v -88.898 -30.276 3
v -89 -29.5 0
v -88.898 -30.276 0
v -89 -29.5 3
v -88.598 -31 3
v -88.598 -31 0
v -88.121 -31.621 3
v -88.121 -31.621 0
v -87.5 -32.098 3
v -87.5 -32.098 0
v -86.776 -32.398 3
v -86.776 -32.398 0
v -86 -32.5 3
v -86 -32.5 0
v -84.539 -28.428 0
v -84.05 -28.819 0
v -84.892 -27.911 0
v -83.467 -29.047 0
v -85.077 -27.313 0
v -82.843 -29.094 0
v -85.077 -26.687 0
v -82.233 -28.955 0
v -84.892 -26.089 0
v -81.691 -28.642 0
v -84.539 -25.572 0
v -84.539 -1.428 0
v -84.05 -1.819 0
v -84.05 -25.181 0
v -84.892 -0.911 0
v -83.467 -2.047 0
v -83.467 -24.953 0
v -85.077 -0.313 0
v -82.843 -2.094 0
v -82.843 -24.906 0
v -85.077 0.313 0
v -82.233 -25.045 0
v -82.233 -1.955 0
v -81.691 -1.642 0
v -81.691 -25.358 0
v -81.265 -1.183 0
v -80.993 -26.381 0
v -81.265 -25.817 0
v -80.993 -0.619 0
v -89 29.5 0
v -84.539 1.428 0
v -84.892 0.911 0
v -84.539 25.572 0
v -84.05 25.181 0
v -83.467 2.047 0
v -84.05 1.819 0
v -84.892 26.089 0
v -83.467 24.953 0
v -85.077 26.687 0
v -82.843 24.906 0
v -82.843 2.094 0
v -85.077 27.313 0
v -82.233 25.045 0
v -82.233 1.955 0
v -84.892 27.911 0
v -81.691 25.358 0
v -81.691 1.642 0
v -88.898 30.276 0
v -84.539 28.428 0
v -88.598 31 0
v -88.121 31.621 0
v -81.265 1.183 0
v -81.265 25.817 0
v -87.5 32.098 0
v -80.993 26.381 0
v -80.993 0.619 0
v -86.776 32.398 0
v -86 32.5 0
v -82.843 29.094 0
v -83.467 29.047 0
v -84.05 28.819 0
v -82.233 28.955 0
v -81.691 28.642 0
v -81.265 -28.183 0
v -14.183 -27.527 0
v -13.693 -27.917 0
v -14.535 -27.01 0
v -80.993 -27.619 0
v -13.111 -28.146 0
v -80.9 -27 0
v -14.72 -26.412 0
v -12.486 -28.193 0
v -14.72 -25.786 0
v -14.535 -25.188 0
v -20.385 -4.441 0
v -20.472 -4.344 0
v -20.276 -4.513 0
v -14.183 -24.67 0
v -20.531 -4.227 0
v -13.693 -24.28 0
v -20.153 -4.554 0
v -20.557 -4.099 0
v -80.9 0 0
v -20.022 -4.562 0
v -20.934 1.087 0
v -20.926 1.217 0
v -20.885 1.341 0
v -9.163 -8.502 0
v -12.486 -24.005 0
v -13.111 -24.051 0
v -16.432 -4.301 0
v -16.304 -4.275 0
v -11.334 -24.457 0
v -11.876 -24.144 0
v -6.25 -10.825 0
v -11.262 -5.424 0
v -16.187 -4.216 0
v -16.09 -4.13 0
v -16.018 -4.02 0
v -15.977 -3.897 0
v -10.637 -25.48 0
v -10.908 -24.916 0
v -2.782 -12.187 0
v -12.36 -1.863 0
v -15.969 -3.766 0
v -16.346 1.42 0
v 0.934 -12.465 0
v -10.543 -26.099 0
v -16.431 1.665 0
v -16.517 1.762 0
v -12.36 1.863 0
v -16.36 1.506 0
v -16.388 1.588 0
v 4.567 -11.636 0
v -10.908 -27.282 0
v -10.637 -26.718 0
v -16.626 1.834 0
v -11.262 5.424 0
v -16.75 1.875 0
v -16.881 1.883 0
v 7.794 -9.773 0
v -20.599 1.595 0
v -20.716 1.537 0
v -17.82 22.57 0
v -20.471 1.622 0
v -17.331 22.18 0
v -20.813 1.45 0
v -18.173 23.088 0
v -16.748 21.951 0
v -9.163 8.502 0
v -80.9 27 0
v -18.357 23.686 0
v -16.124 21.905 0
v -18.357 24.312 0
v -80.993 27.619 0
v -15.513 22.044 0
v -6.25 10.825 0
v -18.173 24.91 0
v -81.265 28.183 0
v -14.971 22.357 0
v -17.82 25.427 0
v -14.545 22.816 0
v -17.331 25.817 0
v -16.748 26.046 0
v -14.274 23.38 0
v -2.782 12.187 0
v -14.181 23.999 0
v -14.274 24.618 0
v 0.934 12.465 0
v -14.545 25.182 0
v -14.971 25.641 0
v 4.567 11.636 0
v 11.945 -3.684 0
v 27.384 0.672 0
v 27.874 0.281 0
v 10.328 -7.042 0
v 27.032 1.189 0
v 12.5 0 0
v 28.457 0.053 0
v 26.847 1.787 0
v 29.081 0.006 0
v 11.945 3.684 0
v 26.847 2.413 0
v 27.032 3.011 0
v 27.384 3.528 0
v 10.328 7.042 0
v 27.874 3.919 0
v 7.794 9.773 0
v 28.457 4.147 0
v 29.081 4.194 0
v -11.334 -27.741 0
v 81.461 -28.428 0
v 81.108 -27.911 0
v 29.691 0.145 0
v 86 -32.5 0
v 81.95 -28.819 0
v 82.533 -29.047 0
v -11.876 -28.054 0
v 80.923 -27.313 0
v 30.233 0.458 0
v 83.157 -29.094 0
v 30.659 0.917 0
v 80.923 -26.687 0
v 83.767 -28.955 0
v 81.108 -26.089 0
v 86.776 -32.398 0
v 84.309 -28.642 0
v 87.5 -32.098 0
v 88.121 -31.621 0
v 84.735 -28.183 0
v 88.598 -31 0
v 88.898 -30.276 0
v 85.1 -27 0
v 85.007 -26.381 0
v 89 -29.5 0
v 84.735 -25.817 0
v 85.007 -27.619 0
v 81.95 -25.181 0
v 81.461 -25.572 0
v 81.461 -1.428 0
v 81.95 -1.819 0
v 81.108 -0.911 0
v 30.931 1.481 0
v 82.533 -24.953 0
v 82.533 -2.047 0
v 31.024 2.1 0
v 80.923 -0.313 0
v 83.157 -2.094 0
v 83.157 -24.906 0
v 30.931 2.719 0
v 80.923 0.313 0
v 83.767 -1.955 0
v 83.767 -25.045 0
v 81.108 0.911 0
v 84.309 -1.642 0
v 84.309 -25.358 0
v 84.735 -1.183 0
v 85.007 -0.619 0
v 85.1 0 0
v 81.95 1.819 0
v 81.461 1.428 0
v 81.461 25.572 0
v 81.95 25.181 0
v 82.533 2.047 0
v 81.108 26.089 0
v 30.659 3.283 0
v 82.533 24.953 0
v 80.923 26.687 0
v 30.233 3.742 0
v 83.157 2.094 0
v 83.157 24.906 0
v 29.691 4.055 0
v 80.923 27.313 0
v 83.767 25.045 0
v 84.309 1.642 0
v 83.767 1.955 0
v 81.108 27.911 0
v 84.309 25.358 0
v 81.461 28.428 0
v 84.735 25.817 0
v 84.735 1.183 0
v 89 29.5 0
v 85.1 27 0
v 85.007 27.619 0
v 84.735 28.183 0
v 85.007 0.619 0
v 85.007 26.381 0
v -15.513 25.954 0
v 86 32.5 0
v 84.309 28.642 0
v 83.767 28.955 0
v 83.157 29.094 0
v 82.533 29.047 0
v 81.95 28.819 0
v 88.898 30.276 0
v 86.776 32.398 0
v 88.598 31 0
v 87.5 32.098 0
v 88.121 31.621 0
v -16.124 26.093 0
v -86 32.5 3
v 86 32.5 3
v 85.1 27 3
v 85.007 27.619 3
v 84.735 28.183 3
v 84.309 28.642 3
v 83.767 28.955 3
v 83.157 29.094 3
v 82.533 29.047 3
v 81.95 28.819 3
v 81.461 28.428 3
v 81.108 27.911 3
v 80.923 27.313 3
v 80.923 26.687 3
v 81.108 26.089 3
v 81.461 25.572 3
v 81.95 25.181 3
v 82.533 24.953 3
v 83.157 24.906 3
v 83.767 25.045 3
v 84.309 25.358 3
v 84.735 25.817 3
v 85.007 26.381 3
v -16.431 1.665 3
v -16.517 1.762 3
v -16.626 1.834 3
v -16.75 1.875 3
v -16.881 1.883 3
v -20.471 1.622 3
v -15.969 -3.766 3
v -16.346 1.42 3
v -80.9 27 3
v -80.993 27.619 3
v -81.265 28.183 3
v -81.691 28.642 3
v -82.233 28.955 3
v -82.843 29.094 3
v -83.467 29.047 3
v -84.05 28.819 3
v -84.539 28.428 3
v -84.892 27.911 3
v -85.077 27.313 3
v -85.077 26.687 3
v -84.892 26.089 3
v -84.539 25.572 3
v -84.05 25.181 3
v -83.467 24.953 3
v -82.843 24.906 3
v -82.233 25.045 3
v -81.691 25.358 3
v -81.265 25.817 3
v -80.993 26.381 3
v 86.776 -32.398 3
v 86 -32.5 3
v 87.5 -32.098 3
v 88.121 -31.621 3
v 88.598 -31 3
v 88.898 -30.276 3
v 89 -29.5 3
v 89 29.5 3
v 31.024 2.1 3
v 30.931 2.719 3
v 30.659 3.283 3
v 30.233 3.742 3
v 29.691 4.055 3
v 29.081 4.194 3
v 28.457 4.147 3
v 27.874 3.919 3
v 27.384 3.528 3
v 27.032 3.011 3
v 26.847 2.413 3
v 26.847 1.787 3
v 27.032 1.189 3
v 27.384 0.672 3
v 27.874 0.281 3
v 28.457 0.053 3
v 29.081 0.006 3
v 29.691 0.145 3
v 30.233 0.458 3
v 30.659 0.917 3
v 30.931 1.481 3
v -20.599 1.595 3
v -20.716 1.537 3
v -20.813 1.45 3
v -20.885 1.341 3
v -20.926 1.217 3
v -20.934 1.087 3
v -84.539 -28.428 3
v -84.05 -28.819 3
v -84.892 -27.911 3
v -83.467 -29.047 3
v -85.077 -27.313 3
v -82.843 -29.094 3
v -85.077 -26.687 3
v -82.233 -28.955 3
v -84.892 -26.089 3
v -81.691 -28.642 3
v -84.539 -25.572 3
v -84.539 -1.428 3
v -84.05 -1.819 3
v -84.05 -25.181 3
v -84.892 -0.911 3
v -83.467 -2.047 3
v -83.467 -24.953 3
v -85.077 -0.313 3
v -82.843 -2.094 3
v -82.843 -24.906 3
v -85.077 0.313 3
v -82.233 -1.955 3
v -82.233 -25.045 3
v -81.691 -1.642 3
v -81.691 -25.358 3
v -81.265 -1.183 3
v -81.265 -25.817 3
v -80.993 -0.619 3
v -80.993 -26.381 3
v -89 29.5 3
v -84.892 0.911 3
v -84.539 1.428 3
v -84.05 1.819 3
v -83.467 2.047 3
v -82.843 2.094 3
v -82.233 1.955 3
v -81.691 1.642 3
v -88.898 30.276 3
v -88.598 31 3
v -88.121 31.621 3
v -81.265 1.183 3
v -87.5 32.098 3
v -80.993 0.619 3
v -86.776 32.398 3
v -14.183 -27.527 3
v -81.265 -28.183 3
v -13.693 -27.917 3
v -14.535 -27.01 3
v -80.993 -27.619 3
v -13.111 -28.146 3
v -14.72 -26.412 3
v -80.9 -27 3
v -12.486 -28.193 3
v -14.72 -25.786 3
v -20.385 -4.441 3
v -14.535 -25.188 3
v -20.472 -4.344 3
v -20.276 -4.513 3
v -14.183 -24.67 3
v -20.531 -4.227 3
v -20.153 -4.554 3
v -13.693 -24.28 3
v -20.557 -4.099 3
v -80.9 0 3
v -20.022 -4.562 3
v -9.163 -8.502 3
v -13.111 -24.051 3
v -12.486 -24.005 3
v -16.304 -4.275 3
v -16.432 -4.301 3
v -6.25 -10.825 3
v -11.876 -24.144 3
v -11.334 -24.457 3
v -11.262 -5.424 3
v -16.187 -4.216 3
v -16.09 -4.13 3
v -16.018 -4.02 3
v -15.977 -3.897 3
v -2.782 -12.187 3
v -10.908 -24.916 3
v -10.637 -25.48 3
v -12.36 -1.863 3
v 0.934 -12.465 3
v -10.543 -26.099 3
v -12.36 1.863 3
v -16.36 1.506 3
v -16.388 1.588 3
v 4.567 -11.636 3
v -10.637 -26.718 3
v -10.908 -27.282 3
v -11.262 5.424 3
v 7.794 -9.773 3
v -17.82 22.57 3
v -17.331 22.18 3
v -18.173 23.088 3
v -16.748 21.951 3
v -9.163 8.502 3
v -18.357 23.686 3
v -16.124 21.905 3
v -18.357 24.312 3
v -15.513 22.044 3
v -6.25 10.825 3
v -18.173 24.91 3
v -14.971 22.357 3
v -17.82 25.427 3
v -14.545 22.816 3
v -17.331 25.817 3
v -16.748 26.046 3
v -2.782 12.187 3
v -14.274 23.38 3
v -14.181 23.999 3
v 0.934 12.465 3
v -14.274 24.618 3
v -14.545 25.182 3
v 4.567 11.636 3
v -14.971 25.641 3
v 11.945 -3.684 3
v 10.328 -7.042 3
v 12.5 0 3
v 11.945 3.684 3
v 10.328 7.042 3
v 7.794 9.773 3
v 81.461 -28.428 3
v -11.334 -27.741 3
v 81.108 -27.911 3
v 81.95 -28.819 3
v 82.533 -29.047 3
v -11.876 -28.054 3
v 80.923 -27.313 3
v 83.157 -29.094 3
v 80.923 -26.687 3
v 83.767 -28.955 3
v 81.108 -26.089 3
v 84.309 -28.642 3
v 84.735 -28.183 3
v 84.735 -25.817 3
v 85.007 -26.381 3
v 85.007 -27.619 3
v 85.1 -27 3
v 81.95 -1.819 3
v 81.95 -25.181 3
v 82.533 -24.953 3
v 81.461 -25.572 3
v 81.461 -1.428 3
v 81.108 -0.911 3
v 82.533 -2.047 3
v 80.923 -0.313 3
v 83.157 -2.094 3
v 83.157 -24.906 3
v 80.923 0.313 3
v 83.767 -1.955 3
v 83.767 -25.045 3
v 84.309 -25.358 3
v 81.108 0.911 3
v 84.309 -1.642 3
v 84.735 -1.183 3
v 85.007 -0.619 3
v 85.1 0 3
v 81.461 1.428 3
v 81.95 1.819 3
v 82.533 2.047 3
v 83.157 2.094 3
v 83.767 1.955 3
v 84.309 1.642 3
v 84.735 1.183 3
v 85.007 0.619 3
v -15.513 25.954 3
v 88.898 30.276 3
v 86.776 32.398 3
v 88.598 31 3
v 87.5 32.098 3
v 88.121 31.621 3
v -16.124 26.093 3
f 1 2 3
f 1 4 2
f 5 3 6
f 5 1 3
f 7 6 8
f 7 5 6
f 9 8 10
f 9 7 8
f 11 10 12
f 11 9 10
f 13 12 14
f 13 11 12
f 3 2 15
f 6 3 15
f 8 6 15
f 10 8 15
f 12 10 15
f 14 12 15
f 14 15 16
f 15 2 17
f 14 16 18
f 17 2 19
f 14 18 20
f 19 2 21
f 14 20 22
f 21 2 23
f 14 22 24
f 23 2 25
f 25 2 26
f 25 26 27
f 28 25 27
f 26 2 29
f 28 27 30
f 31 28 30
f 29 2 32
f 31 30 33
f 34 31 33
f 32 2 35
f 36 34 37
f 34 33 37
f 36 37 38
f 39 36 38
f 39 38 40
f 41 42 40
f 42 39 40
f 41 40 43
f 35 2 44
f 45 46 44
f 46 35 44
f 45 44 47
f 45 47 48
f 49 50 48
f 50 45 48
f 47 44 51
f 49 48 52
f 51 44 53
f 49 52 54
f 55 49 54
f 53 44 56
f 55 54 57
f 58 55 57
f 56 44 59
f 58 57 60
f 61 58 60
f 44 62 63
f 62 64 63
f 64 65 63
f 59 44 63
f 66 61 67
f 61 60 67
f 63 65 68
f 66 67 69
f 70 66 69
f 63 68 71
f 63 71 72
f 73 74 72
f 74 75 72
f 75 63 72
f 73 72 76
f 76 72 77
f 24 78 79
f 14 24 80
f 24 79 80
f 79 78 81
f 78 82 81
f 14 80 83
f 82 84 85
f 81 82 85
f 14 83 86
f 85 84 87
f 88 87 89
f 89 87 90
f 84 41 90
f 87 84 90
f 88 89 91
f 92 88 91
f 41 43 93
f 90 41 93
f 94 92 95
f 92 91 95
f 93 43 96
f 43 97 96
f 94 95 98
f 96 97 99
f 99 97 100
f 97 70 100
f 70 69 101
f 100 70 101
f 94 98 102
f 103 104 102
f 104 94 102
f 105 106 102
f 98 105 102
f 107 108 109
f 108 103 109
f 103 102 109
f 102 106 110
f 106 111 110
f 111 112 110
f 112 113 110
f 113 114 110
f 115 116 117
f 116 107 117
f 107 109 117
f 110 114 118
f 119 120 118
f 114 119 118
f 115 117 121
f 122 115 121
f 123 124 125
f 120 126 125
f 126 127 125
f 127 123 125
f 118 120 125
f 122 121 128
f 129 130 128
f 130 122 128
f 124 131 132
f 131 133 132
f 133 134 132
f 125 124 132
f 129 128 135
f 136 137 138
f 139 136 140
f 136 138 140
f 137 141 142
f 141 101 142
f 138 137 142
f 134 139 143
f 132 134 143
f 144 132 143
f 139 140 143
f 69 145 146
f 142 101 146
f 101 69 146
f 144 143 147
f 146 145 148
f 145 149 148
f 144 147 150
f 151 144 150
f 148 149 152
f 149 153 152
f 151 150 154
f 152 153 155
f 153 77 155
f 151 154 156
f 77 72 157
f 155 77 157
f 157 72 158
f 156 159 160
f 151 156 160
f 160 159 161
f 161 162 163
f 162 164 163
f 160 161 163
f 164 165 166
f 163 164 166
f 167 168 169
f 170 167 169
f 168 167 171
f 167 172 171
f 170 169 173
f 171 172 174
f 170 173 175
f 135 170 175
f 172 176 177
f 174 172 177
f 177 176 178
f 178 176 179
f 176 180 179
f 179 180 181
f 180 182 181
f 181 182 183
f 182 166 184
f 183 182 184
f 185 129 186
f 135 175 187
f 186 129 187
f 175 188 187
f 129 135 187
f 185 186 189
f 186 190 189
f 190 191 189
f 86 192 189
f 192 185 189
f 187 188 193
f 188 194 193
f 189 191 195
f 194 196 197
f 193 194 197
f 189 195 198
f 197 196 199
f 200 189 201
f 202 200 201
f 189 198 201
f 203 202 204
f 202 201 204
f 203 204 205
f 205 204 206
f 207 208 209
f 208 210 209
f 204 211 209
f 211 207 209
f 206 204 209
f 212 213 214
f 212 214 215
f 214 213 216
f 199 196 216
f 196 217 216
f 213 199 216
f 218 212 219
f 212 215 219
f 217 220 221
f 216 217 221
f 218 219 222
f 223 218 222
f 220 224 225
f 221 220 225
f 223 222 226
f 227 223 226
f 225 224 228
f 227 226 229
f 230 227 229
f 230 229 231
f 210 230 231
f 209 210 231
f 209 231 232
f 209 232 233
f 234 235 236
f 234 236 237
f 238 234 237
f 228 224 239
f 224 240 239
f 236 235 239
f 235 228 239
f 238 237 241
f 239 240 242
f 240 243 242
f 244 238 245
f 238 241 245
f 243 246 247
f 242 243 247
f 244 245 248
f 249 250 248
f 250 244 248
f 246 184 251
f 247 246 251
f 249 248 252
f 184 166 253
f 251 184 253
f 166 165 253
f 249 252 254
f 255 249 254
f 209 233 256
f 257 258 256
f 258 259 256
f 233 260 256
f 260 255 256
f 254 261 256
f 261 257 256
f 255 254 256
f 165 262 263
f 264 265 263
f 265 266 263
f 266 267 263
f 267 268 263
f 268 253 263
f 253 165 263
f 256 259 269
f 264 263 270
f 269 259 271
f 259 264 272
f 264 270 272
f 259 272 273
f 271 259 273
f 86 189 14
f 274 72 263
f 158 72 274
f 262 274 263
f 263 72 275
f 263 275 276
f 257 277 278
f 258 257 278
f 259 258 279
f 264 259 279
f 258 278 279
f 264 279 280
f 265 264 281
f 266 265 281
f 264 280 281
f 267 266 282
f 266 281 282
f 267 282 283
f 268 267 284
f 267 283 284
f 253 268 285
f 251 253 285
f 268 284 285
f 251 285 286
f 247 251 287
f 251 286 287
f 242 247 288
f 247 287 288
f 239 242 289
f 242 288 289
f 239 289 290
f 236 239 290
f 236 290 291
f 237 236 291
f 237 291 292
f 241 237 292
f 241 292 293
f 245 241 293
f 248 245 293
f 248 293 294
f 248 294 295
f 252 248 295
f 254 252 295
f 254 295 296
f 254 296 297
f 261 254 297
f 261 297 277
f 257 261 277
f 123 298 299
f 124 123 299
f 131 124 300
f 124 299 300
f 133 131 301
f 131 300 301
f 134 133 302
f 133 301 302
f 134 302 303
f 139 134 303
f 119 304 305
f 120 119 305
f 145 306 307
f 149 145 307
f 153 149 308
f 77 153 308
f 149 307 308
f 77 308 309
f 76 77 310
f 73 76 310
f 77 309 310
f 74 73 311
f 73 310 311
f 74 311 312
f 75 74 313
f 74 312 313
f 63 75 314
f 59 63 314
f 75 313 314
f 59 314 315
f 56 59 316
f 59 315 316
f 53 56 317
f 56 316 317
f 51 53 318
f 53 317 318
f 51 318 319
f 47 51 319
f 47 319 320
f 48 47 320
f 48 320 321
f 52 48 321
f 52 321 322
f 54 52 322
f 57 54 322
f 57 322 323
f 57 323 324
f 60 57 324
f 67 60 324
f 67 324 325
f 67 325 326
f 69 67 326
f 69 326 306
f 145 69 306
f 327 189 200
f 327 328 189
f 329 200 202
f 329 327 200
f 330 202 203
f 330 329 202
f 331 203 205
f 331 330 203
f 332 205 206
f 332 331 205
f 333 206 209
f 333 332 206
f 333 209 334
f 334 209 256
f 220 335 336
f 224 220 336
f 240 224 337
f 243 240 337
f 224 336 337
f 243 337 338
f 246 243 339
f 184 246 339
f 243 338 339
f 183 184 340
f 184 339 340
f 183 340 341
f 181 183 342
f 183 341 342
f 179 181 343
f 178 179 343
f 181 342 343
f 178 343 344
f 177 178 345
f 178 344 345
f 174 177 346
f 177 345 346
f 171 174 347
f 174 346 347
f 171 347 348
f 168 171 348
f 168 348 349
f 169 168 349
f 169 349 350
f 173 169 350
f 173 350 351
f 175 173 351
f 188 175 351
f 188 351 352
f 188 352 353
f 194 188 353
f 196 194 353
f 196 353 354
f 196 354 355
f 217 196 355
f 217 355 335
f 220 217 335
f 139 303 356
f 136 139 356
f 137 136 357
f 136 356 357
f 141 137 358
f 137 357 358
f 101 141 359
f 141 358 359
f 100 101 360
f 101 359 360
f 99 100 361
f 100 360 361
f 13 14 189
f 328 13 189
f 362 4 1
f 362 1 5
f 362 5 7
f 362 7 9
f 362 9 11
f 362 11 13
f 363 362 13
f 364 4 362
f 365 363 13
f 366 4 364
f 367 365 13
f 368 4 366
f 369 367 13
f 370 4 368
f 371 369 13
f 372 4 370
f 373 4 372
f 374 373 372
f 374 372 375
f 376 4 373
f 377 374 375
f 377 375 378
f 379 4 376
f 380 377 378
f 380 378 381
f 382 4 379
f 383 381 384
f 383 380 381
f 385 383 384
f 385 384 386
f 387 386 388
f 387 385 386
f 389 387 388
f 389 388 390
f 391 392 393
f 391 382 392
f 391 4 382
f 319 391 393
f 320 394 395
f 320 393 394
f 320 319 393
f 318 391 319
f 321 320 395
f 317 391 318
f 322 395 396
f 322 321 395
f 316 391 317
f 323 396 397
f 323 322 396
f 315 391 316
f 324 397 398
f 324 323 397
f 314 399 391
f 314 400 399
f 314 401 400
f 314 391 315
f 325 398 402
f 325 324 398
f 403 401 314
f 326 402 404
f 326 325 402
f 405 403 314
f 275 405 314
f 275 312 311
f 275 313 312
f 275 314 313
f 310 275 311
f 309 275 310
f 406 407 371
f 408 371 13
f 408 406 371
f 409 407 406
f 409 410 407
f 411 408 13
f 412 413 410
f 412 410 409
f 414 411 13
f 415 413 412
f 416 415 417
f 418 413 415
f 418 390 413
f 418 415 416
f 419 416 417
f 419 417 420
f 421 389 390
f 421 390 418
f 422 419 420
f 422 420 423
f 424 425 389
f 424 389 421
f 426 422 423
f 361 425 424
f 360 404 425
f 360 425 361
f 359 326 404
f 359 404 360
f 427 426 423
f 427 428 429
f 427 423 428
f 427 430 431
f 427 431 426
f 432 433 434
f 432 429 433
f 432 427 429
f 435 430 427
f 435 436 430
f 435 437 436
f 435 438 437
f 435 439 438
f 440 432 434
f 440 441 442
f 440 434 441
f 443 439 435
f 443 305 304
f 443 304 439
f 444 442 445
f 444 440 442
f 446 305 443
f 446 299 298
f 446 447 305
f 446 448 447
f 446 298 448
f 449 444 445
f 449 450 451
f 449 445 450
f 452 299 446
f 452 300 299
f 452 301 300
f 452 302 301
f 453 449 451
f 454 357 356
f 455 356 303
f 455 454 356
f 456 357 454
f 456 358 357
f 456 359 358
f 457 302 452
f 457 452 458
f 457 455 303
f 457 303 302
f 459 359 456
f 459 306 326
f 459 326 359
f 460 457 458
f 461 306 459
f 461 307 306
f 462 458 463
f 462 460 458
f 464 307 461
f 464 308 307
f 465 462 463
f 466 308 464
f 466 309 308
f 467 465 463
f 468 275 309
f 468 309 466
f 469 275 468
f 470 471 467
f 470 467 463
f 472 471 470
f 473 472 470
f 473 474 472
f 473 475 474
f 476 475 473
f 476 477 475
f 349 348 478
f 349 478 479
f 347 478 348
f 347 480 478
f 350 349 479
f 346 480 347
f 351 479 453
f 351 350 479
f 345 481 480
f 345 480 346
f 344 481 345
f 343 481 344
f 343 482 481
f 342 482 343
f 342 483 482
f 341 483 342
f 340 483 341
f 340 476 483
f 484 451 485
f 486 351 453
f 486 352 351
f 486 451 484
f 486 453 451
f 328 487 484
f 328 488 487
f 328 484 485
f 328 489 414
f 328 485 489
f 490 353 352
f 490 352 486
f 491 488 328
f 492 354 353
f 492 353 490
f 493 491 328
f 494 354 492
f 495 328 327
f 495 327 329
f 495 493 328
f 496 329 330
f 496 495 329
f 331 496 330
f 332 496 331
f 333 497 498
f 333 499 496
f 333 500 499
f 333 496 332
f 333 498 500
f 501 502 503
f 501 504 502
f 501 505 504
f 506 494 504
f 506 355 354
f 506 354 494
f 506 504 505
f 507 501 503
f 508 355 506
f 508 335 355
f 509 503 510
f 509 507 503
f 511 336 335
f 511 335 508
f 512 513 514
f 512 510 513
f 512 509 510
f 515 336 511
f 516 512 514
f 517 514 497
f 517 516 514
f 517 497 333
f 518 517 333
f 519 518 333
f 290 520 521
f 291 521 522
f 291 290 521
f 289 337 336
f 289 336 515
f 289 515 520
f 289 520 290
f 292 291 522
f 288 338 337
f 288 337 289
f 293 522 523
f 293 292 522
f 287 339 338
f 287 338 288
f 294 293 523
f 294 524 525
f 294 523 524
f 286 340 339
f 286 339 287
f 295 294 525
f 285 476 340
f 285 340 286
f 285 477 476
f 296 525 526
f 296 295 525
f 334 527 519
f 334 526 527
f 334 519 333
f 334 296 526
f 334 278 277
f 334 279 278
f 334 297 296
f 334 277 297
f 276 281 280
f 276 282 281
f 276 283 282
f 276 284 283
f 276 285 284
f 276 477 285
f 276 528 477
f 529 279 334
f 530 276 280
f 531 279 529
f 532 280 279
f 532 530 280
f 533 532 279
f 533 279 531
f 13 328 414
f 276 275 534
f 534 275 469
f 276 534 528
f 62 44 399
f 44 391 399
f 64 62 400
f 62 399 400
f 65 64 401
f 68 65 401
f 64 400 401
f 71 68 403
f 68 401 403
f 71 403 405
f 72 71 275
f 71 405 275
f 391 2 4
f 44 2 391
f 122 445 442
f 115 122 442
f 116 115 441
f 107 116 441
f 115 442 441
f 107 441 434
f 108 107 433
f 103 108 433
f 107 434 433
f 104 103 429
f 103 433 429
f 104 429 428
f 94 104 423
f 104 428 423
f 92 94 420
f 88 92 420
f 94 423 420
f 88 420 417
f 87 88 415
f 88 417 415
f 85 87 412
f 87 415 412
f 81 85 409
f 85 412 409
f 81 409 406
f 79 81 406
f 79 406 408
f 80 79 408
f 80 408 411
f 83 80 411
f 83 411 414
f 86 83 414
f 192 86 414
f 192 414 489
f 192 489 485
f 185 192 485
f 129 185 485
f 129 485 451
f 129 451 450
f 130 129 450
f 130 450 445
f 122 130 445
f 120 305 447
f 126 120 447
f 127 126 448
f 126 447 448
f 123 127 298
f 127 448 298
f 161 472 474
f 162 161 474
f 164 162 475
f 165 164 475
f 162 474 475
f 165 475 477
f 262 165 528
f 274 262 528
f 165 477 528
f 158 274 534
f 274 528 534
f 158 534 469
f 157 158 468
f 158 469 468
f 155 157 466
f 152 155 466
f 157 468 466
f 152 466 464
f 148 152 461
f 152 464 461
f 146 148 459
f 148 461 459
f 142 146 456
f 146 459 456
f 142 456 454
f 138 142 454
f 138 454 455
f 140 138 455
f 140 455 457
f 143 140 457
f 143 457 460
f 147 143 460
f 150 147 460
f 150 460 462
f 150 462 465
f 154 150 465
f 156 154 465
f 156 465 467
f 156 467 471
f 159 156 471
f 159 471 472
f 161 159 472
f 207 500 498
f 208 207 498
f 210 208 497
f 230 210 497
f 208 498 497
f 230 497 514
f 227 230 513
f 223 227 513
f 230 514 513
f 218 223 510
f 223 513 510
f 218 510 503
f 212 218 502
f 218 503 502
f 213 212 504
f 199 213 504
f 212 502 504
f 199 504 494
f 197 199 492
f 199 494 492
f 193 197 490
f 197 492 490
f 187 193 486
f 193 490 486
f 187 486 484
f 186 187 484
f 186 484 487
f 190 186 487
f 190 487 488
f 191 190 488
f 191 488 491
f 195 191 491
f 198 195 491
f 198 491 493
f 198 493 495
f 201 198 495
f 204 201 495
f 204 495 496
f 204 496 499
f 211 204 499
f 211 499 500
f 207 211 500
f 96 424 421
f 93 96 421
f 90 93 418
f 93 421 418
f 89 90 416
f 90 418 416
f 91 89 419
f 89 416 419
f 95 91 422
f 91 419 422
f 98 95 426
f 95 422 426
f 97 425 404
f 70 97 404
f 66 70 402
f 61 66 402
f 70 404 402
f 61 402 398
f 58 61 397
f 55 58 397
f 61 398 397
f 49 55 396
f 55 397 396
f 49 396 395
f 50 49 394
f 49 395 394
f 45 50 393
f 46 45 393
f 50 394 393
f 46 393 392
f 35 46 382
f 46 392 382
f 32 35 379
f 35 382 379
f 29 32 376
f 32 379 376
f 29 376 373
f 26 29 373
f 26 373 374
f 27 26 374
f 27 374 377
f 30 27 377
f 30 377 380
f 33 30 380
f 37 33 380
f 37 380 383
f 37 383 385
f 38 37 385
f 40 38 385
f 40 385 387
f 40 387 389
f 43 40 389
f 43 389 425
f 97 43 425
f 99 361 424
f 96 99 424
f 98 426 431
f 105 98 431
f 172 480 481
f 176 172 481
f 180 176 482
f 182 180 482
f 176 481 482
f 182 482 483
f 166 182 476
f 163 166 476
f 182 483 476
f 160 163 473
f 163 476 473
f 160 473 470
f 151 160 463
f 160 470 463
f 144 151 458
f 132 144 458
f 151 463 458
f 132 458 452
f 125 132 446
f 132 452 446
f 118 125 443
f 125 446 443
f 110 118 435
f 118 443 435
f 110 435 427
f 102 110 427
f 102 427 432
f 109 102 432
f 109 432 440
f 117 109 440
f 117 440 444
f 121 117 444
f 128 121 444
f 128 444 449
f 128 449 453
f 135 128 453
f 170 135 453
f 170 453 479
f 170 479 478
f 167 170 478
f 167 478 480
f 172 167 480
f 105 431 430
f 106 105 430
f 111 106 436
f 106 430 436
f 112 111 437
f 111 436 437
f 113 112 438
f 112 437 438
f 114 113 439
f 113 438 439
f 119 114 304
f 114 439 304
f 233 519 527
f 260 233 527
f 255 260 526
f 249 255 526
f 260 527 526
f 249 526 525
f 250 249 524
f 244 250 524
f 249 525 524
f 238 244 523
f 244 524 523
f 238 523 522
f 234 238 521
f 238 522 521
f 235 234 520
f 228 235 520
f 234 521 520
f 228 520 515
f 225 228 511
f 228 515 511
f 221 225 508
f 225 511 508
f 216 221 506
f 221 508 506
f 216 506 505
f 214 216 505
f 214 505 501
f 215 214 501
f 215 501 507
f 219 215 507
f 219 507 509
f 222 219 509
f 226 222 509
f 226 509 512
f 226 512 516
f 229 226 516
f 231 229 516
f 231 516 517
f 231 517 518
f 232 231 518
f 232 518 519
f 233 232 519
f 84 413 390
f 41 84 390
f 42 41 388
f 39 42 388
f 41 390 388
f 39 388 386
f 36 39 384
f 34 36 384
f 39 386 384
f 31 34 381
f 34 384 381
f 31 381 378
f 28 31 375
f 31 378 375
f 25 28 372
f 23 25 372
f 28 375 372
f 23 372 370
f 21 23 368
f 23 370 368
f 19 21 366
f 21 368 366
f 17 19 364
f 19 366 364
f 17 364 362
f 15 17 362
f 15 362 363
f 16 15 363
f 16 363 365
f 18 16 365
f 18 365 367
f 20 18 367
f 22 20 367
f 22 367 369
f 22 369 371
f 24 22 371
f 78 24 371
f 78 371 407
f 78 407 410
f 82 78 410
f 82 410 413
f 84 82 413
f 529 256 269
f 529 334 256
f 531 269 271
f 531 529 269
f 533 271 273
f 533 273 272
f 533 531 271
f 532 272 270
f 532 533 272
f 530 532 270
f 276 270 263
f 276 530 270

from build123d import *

# Parameters (mm, degrees)
SKETCH_1_W          = 178
SKETCH_1_H          = 65
EXTRUDE_1_DEPTH     = 3
FILLET_1_R          = 3
SKETCH_2_R          = 2.1
SKETCH_2_R_2        = 12.5
SKETCH_2_R_3        = 11
SKETCH_2_R_4        = 1.8
CUT_EXTRUDE_1_DEPTH = 10


with BuildPart() as part:
    # 草图1 → 凸台-拉伸1 (new body)
    with BuildSketch(Plane.XY):
        Rectangle(SKETCH_1_W, SKETCH_1_H)
    extrude(amount=EXTRUDE_1_DEPTH)

    # 圆角1
    fillet_1_edges = [part.edges().sort_by_distance(p)[0] for p in [
        (-89, 32.5, 1.5),
        (89, 32.5, 1.5),
        (89, -32.5, 1.5),
        (-89, -32.5, 1.5),
    ]]
    fillet(fillet_1_edges, radius=FILLET_1_R)

    # 草图2 → 切除-拉伸1 (cut)
    # profile 1 of 14: a face of its own
    with BuildSketch(Plane.XY.offset(3)):
        with Locations((-83, 27)):
            Circle(SKETCH_2_R)
    # profile 2 of 14: a face of its own
    with BuildSketch(Plane.XY.offset(3)):
        with Locations((-83, 0)):
            Circle(SKETCH_2_R)
    # profile 3 of 14: a face of its own
    with BuildSketch(Plane.XY.offset(3)):
        with Locations((-83, -27)):
            Circle(SKETCH_2_R)
    # profile 4 of 14: a face of its own
    with BuildSketch(Plane.XY.offset(3)):
        Circle(SKETCH_2_R_2)
        Circle(SKETCH_2_R_3, mode=Mode.SUBTRACT)
    # profile 5 of 14: a face of its own
    with BuildSketch(Plane.XY.offset(3)):
        Circle(SKETCH_2_R_3)
    # profile 6 of 14: a face of its own
    with BuildSketch(Plane.XY.offset(3)):
        with Locations((-16.280586137, 23.998802367)):
            Circle(SKETCH_2_R)
        with Locations((-16.280586137, 23.998802367)):
            Circle(SKETCH_2_R_4, mode=Mode.SUBTRACT)
    # profile 7 of 14: a face of its own
    with BuildSketch(Plane.XY.offset(3)):
        with Locations((-16.280586137, 23.998802367)):
            Circle(SKETCH_2_R_4)
    # profile 8 of 14: a face of its own
    with BuildSketch(Plane.XY.offset(3)):
        with Locations((28.923865578, 2.1)):
            Circle(SKETCH_2_R)
        with Locations((28.923865578, 2.1)):
            Circle(SKETCH_2_R_4, mode=Mode.SUBTRACT)
    # profile 9 of 14: a face of its own
    with BuildSketch(Plane.XY.offset(3)):
        with Locations((28.923865578, 2.1)):
            Circle(SKETCH_2_R_4)
    # profile 10 of 14: a face of its own
    with BuildSketch(Plane.XY.offset(3)):
        with Locations((-12.643279441, -26.098802367)):
            Circle(SKETCH_2_R)
    # profile 11 of 14: a face of its own
    with BuildSketch(Plane.XY.offset(3)):
        with BuildLine():
            Line((-15.969193875, -3.766277604), (-16.345745599, 1.420070707))
            ThreePointArc((-16.345745599, 1.420070707), (-16.372108992, 1.547906767), (-16.430660482, 1.664563571))
            ThreePointArc((-16.430660482, 1.664563571), (-16.62644536, 1.833843162), (-16.880639833, 1.882551148))
            Line((-16.880639833, 1.882551148), (-20.471188664, 1.621861493))
            ThreePointArc((-20.471188664, 1.621861493), (-20.813209107, 1.450197211), (-20.933669105, 1.086967259))
            Line((-20.933669105, 1.086967259), (-20.55711738, -4.099381052))
            ThreePointArc((-20.55711738, -4.099381052), (-20.385453099, -4.441401495), (-20.022223146, -4.561861493))
            Line((-20.022223146, -4.561861493), (-16.431674316, -4.301171838))
            ThreePointArc((-16.431674316, -4.301171838), (-16.089653872, -4.129507556), (-15.969193875, -3.766277604))
        make_face()
    # profile 12 of 14: a face of its own
    with BuildSketch(Plane.XY.offset(3)):
        with Locations((83, 27)):
            Circle(SKETCH_2_R)
    # profile 13 of 14: a face of its own
    with BuildSketch(Plane.XY.offset(3)):
        with Locations((83, 0)):
            Circle(SKETCH_2_R)
    # profile 14 of 14: a face of its own
    with BuildSketch(Plane.XY.offset(3)):
        with Locations((83, -27)):
            Circle(SKETCH_2_R)
    extrude(amount=-CUT_EXTRUDE_1_DEPTH, mode=Mode.SUBTRACT)


solid = part.part
